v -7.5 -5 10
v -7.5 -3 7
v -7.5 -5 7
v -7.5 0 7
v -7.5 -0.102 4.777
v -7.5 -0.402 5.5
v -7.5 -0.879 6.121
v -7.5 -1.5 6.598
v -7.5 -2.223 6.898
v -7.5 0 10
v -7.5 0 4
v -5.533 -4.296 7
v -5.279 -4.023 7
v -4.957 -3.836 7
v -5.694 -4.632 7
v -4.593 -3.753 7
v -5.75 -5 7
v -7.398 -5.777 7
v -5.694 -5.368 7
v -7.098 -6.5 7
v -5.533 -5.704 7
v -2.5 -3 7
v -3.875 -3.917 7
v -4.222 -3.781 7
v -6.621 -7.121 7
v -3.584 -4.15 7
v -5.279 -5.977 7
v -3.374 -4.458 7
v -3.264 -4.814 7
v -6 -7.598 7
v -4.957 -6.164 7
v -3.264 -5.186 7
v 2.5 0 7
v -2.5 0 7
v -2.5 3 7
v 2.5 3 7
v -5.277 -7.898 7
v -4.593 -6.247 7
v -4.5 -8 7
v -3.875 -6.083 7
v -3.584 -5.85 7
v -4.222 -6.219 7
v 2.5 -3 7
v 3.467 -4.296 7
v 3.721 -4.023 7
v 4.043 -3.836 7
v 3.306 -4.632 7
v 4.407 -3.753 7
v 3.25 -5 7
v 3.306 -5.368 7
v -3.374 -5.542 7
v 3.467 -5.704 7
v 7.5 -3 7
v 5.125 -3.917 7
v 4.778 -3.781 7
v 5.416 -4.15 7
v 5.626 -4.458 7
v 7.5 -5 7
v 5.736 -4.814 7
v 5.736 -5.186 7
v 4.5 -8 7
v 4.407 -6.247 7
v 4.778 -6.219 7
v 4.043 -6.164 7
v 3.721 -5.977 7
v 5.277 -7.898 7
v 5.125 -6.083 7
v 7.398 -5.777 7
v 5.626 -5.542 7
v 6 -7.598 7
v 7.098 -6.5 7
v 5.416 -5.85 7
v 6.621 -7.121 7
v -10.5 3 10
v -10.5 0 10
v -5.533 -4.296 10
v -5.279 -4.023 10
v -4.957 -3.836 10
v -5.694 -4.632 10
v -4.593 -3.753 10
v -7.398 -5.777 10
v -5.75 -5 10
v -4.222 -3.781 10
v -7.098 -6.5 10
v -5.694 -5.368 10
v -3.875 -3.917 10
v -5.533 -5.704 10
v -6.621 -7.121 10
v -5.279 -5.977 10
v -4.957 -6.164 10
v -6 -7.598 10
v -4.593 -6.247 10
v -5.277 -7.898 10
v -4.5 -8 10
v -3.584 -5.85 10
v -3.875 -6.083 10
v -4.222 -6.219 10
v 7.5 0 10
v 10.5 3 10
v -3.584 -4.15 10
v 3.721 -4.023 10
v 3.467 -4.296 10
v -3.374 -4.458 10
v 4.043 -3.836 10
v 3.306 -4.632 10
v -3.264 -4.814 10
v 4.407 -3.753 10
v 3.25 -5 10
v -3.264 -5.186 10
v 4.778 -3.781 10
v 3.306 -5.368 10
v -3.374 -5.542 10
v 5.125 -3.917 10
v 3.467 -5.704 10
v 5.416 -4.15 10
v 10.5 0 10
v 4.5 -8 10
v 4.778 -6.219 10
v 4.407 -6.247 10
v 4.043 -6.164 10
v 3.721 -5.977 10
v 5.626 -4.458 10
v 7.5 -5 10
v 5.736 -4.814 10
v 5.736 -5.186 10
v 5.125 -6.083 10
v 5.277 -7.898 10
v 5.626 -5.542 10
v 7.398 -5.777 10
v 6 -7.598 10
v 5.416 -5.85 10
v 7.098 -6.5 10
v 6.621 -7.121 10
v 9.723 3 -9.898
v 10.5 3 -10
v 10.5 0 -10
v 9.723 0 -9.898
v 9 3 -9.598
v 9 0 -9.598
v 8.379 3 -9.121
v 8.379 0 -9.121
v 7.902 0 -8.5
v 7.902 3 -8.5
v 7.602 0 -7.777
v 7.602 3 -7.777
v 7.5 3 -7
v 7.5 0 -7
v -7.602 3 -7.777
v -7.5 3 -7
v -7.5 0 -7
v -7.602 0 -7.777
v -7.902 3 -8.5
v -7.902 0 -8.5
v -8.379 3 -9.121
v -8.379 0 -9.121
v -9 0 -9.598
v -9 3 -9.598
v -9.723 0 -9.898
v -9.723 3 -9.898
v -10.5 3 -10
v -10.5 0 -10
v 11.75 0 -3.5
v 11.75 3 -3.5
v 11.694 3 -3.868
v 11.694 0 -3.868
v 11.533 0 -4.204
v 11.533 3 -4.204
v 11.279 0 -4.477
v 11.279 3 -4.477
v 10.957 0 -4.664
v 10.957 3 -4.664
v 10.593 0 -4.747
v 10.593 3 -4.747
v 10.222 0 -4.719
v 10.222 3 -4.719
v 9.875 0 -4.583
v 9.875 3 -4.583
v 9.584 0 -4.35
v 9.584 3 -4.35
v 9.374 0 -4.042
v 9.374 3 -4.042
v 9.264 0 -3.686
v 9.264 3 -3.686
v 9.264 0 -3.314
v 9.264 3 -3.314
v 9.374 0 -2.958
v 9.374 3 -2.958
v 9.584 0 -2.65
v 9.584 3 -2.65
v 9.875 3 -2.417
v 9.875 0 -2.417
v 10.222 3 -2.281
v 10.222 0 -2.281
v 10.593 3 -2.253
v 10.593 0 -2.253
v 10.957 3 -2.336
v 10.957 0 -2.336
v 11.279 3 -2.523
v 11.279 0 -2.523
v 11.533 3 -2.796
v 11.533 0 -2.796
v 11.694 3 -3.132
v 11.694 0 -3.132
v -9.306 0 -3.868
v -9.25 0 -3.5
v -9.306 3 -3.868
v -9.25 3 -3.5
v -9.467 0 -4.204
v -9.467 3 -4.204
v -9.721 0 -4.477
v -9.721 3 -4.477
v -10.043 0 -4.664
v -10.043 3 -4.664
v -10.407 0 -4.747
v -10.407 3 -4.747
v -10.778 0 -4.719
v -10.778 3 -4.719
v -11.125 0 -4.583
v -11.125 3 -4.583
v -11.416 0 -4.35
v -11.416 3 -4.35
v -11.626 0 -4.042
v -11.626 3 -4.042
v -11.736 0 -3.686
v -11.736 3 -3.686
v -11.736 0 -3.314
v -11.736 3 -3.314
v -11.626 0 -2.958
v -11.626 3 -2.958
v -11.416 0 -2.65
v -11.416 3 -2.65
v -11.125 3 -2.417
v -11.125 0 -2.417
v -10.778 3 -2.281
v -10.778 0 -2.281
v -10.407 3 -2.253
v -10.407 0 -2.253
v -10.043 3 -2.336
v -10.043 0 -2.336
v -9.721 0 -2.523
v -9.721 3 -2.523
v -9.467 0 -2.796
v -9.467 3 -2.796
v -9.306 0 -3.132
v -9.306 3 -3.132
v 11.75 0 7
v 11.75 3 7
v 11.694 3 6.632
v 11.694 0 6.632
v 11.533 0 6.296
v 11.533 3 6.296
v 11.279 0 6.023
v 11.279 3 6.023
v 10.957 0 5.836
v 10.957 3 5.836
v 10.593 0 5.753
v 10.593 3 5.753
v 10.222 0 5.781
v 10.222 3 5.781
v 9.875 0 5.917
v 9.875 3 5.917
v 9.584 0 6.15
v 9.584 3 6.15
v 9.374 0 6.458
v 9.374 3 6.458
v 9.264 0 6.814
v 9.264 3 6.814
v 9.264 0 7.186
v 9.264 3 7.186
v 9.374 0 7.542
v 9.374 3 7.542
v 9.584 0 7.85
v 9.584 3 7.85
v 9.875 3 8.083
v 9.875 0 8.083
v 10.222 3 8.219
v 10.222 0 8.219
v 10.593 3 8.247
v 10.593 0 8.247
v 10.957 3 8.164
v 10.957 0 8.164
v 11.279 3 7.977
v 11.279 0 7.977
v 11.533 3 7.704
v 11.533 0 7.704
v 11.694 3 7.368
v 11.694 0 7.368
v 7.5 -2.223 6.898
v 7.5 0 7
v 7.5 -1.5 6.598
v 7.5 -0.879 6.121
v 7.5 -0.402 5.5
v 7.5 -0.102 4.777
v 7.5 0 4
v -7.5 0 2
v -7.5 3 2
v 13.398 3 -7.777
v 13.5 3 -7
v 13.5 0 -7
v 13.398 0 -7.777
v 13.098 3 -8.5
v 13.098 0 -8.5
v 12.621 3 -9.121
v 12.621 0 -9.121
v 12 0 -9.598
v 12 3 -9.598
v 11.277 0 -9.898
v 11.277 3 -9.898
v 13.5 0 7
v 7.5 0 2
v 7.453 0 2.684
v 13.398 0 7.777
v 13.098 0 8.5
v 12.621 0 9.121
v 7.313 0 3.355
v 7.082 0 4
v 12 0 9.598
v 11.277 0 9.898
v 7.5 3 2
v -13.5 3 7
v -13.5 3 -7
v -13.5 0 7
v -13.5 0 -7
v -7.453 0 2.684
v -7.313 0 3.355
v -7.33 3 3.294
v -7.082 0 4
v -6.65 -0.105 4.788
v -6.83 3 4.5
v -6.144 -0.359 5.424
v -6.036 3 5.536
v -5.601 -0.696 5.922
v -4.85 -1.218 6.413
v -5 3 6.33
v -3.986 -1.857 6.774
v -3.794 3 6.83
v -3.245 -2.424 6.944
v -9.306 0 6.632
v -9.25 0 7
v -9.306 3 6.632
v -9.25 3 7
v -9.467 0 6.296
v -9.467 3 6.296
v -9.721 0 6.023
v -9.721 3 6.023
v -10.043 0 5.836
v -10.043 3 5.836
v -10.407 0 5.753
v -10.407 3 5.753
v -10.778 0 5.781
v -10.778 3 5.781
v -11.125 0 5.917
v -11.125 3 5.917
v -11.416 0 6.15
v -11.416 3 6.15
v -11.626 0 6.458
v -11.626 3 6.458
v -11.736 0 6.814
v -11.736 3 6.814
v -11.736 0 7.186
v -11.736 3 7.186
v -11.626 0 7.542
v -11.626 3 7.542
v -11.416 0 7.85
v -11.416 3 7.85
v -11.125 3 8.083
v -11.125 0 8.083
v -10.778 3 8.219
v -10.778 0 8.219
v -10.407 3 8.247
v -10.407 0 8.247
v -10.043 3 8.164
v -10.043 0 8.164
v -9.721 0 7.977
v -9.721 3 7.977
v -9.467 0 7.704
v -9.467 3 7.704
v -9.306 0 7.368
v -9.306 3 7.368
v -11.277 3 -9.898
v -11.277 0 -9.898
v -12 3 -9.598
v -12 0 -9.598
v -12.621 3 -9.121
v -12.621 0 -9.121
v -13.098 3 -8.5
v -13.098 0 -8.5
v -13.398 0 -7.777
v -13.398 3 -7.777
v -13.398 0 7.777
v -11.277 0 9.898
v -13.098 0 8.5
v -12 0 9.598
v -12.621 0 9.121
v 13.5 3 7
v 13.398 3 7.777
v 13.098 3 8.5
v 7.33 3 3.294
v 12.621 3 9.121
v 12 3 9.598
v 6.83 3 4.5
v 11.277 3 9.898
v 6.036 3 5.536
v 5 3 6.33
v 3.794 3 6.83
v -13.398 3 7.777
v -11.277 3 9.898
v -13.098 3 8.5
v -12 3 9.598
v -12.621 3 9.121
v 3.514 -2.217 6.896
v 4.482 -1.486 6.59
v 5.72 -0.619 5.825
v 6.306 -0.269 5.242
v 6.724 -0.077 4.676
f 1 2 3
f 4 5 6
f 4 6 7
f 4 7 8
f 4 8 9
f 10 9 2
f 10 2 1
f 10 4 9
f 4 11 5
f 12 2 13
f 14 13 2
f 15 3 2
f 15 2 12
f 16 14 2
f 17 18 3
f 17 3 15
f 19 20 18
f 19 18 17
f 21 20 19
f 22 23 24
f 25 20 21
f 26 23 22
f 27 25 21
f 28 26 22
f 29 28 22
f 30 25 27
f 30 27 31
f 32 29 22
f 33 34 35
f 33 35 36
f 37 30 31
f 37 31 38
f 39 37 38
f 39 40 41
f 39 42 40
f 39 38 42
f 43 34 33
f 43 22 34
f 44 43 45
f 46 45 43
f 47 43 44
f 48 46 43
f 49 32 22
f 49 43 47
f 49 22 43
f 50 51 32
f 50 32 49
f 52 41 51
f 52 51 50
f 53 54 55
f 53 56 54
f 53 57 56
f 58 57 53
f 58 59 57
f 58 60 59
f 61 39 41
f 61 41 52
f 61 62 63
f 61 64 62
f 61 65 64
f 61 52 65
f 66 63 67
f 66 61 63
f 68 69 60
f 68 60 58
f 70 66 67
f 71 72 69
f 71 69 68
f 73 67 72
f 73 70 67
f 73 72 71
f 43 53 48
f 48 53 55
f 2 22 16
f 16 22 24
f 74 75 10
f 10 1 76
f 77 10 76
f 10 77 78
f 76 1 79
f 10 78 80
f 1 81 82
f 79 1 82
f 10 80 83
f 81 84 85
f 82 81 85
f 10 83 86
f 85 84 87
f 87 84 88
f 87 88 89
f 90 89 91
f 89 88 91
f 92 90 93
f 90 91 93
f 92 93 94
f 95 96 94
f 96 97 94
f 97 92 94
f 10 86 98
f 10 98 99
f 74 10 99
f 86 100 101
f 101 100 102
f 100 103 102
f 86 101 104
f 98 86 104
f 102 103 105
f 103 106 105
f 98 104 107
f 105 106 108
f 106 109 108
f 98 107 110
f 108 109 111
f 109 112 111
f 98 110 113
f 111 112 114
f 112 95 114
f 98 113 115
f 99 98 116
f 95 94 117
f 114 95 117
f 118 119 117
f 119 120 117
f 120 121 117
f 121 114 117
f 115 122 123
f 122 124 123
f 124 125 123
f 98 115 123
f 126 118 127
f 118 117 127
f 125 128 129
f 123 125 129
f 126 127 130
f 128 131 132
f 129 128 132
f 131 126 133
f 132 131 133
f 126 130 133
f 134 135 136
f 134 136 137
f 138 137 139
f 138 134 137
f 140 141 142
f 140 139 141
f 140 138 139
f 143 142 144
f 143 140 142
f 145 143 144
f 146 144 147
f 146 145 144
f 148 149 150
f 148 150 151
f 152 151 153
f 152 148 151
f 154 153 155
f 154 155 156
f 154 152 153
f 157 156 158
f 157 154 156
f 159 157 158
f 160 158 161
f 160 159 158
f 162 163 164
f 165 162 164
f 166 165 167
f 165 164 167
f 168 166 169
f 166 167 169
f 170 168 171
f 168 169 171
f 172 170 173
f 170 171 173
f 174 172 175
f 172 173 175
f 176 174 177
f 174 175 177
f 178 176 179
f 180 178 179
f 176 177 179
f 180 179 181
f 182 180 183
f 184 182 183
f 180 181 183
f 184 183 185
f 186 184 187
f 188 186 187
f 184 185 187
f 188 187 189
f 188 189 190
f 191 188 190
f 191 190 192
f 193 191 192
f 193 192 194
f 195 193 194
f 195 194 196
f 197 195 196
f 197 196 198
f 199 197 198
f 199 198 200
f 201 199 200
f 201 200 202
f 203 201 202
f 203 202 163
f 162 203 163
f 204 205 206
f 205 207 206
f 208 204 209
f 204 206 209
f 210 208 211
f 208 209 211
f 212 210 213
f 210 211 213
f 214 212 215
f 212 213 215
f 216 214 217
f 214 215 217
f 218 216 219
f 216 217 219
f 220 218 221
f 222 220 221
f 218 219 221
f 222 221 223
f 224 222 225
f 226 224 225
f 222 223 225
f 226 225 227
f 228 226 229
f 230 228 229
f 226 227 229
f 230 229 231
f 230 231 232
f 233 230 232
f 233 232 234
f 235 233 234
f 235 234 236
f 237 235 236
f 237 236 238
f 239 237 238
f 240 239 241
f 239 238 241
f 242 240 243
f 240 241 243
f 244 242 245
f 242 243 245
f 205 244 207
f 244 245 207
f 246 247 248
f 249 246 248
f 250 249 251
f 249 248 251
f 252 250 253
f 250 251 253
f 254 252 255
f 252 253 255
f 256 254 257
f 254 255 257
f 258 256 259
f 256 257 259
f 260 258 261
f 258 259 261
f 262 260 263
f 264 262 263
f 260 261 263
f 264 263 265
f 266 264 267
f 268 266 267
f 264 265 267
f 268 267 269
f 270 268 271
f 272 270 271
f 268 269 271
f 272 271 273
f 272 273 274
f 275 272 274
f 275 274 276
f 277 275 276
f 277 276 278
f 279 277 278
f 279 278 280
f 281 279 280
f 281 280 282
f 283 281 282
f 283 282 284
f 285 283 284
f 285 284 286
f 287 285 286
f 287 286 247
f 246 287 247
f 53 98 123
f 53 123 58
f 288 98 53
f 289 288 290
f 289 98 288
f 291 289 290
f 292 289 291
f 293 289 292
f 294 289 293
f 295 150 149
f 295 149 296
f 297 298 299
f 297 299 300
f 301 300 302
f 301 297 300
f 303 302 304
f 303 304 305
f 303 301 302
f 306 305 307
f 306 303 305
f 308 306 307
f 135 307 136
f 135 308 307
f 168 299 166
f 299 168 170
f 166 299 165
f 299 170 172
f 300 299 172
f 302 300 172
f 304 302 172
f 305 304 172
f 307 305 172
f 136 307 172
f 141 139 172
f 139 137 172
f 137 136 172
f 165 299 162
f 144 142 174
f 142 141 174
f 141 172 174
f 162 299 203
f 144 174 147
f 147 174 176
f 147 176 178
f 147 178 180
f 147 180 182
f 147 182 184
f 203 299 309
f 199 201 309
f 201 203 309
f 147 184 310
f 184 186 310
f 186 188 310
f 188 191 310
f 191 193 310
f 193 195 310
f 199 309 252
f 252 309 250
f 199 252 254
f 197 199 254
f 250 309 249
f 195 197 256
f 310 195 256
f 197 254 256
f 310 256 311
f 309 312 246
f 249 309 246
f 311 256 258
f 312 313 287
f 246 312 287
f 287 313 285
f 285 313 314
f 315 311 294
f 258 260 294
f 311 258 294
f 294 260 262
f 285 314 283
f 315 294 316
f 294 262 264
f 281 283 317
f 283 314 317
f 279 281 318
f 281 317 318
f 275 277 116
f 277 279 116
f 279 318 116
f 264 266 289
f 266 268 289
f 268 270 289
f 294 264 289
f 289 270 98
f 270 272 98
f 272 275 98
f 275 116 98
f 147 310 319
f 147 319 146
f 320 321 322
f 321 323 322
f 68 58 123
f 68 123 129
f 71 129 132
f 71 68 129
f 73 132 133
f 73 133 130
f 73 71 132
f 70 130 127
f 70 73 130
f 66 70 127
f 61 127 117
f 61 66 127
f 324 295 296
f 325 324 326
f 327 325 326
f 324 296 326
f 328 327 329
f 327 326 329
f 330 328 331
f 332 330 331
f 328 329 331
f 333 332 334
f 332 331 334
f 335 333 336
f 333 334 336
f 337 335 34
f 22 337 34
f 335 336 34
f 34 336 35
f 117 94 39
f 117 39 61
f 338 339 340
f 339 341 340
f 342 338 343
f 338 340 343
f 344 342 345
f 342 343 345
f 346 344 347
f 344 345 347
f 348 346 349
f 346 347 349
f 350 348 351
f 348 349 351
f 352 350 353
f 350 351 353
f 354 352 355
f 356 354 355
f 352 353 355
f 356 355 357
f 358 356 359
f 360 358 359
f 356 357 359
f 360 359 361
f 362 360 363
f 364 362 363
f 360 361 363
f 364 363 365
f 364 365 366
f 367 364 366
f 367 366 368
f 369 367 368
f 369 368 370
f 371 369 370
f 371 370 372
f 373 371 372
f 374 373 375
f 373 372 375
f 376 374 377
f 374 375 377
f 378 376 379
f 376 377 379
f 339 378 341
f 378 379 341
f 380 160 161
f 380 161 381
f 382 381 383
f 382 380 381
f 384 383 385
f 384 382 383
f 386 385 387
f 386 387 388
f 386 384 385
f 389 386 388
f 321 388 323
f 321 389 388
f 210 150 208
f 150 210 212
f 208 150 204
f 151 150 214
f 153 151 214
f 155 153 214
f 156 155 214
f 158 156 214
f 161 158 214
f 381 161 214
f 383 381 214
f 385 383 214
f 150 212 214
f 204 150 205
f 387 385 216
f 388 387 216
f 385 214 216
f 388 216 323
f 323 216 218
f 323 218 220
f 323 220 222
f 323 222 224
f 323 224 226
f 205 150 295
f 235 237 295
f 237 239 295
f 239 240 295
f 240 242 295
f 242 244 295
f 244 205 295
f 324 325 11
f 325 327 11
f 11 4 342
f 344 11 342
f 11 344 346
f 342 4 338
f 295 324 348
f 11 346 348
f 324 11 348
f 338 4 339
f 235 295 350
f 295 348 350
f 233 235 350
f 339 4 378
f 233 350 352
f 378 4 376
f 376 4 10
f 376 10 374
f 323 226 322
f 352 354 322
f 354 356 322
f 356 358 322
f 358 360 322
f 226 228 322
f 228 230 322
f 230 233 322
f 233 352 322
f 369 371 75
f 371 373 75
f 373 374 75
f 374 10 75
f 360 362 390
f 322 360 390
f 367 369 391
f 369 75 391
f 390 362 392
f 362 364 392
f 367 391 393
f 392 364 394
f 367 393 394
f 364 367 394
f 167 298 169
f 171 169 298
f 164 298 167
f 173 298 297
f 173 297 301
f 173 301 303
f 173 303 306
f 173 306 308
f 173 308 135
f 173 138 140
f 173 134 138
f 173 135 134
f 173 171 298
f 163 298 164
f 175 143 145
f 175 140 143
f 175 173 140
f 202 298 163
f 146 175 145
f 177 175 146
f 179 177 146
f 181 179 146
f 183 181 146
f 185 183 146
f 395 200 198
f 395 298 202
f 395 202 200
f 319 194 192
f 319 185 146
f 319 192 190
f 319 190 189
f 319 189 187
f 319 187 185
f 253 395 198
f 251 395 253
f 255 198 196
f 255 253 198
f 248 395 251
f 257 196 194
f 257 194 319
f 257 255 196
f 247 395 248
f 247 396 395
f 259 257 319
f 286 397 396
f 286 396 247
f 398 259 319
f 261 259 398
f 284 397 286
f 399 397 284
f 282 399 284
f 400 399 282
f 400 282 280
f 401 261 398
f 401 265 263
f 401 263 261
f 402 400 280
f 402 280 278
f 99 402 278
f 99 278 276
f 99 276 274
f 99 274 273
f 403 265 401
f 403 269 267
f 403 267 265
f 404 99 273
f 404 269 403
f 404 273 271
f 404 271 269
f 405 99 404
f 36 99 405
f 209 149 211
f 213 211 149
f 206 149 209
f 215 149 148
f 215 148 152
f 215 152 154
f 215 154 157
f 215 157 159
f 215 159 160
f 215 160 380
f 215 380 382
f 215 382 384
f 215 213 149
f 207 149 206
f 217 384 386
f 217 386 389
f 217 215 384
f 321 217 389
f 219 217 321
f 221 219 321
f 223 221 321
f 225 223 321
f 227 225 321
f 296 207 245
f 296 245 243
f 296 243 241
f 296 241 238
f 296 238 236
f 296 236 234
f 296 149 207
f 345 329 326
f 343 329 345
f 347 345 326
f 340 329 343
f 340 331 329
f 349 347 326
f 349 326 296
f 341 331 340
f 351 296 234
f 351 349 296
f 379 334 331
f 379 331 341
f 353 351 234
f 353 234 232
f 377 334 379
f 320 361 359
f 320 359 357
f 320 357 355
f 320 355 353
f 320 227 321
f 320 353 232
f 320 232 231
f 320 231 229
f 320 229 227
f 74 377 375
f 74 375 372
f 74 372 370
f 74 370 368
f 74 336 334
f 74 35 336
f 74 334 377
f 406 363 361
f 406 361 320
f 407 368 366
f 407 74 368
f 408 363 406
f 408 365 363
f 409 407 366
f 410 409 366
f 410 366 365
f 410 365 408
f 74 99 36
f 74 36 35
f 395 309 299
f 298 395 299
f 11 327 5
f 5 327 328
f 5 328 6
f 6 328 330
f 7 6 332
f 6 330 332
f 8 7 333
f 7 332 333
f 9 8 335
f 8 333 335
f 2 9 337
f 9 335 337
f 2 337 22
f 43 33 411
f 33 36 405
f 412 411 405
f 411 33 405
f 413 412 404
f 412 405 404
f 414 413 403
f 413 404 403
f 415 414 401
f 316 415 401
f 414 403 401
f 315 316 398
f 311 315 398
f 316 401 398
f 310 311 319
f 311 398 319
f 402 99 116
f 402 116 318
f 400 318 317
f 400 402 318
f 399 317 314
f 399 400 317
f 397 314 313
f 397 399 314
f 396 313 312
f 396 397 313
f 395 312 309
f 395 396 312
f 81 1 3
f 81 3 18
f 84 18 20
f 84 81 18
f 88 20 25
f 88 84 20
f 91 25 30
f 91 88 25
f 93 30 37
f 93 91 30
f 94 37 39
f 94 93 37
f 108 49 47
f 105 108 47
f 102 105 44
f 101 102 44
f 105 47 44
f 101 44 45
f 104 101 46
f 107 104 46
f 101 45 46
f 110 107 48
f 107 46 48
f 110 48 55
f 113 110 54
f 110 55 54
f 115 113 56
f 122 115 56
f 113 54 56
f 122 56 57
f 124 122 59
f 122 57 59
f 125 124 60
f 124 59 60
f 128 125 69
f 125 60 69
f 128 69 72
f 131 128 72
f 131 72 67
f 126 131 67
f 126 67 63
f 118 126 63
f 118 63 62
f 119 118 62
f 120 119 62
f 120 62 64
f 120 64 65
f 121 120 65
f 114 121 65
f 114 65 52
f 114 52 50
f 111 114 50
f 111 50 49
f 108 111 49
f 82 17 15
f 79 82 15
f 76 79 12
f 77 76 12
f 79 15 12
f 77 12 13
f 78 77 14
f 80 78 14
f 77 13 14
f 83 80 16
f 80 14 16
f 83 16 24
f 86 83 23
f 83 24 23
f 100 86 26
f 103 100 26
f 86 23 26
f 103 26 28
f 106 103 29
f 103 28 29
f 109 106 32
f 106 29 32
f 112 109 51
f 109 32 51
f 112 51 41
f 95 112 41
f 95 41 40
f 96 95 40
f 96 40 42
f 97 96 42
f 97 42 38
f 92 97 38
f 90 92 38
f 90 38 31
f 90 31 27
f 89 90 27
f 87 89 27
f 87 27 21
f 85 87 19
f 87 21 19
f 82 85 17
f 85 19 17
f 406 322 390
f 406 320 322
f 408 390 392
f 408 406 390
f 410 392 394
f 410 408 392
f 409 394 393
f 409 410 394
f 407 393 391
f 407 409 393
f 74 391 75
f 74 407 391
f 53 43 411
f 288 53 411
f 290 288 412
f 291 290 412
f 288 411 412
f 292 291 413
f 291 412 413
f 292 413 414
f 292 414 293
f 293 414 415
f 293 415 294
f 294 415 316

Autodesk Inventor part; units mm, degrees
ref_plane "YZ Plane" through (0, 0, 0) normal (1, 0, 0) x (0, 1, 0)
ref_plane "XZ Plane" through (0, 0, 0) normal (0, 1, 0) x (-1, 0, 0)
ref_plane "XY Plane" through (0, 0, 0) normal (0, 0, 1) x (1, 0, 0)
sketch "Sketch1" plane through (0, 0, 0) normal (0, 1, 0) x (-1, 0, 0)
  line L0 (13.5, 10) -> (-13.5, 10)
  line L1 (-13.5, 10) -> (-13.5, -10)
  line L2 (-13.5, -10) -> (13.5, -10)
  line L3 (13.5, -10) -> (13.5, 10)
  line L4 (13.5, 10) -> (-13.5, -10) construction
  line L5 (-13.5, 10) -> (13.5, -10) construction
  point P0 (0, 0)
  dimension "d0" = 27
  dimension "d1" = 20
extrude "Extrusion1" add sketch "Sketch1" along normal blind 3
sketch "Sketch2" plane through (0, 3, 0) normal (0, 1, 0) x (1, 0, 0)
  line L0 (-13.5, -10) -> (13.5, -10) projected
  line L1 (0, -10) -> (-10.5, -10)
  line L2 (-10.5, -10) -> (-10.5, -7)
  line L3 (-10.5, -7) -> (-10.5, 3.5)
  circle A0 centre (-10.5, -7) radius 1.25
  circle A1 centre (-10.5, 3.5) radius 1.25
  line L4 (-10.5, -7) -> (10.5, -7)
  line L5 (10.5, -7) -> (10.5, 3.5)
  circle A2 centre (10.5, -7) radius 1.25
  circle A3 centre (10.5, 3.5) radius 1.25
  point P0 (0, 0)
  dimension "d4" = 10.5
  dimension "d5" = 3
  dimension "d6" = 10.5
  dimension "d7" = 2.5
  dimension "d8" = 2.5
  dimension "d9" = 21
  dimension "d10" = 10.5
  dimension "d11" = 2.5
  dimension "d12" = 2.5
extrude "Extrusion2" cut sketch "Sketch2" against normal up to next
sketch "Sketch3" plane through (0, 0, 0) normal (0, -1, 0) x (1, 0, 0)
  line L0 (-13.5, 10) -> (13.5, 10) projected
  line L1 (0, 10) -> (0, 8.5)
  line L2 (7.5, 7) -> (-7.5, 7)
  line L3 (-7.5, 7) -> (-7.5, 10)
  line L4 (-7.5, 10) -> (7.5, 10)
  line L5 (7.5, 10) -> (7.5, 7)
  line L6 (7.5, 7) -> (-7.5, 10) construction
  line L7 (-7.5, 7) -> (7.5, 10) construction
  point P0 (0, 0)
  dimension "d15" = 1.5
  dimension "d16" = 15
  dimension "d17" = 3
extrude "Extrusion3" add sketch "Sketch3" along normal blind 8
sketch "Sketch4" plane through (7.5, 0, 7) normal (0, 0, -1) x (-1, 0, 0)
  circle A0 centre (3, -5) radius 1.25
  circle A1 centre (12, -5) radius 1.25
  line L0 (0, 0) -> (0, -8) projected
  line L1 (15, -8) -> (0, -8) projected
  line L2 (15, 0) -> (15, -8) projected
  point P0 (7.5, 0)
  dimension "d20" = 2.5
  dimension "d21" = 2.5
  dimension "d22" = 3
  dimension "d23" = 3
  dimension "d24" = 3
  dimension "d25" = 3
extrude "Extrusion4" cut sketch "Sketch4" against normal up to next
sketch "Sketch5" plane through (0, 0, 0) normal (0, -1, 0) x (1, 0, 0)
  line L0 (13.5, -10) -> (-13.5, -10) projected
  line L1 (13.5, -10) -> (7.5, -10)
  line L2 (7.5, -10) -> (-7.5, -10)
  line L3 (-7.5, -10) -> (-7.5, 7)
  line L4 (-7.5, 7) -> (7.5, 7)
  line L5 (7.5, 7) -> (7.5, -10)
  point P0 (0, 0)
  dimension "d28" = 6
extrude "Extrusion5" cut sketch "Sketch5" against normal up to next
fillet "Fillet1" radius 5 2 edges at (-7.5, 1.5, 7) (7.5, 1.5, 7)
fillet "Fillet2" radius 3 10 edges at (7.5, 1.5, -10) (13.5, 1.5, -10) (-7.5, 1.5, -10) (-13.5, 1.5, -10) (-13.5, 1.5, 10) (13.5, 1.5, 10) (-7.5, -8, 8.5) (7.5, -8, 8.5) (-5, 0, 7) (5, 0, 7)
properties part number "cam_holder" material "Nylon 6/6"
